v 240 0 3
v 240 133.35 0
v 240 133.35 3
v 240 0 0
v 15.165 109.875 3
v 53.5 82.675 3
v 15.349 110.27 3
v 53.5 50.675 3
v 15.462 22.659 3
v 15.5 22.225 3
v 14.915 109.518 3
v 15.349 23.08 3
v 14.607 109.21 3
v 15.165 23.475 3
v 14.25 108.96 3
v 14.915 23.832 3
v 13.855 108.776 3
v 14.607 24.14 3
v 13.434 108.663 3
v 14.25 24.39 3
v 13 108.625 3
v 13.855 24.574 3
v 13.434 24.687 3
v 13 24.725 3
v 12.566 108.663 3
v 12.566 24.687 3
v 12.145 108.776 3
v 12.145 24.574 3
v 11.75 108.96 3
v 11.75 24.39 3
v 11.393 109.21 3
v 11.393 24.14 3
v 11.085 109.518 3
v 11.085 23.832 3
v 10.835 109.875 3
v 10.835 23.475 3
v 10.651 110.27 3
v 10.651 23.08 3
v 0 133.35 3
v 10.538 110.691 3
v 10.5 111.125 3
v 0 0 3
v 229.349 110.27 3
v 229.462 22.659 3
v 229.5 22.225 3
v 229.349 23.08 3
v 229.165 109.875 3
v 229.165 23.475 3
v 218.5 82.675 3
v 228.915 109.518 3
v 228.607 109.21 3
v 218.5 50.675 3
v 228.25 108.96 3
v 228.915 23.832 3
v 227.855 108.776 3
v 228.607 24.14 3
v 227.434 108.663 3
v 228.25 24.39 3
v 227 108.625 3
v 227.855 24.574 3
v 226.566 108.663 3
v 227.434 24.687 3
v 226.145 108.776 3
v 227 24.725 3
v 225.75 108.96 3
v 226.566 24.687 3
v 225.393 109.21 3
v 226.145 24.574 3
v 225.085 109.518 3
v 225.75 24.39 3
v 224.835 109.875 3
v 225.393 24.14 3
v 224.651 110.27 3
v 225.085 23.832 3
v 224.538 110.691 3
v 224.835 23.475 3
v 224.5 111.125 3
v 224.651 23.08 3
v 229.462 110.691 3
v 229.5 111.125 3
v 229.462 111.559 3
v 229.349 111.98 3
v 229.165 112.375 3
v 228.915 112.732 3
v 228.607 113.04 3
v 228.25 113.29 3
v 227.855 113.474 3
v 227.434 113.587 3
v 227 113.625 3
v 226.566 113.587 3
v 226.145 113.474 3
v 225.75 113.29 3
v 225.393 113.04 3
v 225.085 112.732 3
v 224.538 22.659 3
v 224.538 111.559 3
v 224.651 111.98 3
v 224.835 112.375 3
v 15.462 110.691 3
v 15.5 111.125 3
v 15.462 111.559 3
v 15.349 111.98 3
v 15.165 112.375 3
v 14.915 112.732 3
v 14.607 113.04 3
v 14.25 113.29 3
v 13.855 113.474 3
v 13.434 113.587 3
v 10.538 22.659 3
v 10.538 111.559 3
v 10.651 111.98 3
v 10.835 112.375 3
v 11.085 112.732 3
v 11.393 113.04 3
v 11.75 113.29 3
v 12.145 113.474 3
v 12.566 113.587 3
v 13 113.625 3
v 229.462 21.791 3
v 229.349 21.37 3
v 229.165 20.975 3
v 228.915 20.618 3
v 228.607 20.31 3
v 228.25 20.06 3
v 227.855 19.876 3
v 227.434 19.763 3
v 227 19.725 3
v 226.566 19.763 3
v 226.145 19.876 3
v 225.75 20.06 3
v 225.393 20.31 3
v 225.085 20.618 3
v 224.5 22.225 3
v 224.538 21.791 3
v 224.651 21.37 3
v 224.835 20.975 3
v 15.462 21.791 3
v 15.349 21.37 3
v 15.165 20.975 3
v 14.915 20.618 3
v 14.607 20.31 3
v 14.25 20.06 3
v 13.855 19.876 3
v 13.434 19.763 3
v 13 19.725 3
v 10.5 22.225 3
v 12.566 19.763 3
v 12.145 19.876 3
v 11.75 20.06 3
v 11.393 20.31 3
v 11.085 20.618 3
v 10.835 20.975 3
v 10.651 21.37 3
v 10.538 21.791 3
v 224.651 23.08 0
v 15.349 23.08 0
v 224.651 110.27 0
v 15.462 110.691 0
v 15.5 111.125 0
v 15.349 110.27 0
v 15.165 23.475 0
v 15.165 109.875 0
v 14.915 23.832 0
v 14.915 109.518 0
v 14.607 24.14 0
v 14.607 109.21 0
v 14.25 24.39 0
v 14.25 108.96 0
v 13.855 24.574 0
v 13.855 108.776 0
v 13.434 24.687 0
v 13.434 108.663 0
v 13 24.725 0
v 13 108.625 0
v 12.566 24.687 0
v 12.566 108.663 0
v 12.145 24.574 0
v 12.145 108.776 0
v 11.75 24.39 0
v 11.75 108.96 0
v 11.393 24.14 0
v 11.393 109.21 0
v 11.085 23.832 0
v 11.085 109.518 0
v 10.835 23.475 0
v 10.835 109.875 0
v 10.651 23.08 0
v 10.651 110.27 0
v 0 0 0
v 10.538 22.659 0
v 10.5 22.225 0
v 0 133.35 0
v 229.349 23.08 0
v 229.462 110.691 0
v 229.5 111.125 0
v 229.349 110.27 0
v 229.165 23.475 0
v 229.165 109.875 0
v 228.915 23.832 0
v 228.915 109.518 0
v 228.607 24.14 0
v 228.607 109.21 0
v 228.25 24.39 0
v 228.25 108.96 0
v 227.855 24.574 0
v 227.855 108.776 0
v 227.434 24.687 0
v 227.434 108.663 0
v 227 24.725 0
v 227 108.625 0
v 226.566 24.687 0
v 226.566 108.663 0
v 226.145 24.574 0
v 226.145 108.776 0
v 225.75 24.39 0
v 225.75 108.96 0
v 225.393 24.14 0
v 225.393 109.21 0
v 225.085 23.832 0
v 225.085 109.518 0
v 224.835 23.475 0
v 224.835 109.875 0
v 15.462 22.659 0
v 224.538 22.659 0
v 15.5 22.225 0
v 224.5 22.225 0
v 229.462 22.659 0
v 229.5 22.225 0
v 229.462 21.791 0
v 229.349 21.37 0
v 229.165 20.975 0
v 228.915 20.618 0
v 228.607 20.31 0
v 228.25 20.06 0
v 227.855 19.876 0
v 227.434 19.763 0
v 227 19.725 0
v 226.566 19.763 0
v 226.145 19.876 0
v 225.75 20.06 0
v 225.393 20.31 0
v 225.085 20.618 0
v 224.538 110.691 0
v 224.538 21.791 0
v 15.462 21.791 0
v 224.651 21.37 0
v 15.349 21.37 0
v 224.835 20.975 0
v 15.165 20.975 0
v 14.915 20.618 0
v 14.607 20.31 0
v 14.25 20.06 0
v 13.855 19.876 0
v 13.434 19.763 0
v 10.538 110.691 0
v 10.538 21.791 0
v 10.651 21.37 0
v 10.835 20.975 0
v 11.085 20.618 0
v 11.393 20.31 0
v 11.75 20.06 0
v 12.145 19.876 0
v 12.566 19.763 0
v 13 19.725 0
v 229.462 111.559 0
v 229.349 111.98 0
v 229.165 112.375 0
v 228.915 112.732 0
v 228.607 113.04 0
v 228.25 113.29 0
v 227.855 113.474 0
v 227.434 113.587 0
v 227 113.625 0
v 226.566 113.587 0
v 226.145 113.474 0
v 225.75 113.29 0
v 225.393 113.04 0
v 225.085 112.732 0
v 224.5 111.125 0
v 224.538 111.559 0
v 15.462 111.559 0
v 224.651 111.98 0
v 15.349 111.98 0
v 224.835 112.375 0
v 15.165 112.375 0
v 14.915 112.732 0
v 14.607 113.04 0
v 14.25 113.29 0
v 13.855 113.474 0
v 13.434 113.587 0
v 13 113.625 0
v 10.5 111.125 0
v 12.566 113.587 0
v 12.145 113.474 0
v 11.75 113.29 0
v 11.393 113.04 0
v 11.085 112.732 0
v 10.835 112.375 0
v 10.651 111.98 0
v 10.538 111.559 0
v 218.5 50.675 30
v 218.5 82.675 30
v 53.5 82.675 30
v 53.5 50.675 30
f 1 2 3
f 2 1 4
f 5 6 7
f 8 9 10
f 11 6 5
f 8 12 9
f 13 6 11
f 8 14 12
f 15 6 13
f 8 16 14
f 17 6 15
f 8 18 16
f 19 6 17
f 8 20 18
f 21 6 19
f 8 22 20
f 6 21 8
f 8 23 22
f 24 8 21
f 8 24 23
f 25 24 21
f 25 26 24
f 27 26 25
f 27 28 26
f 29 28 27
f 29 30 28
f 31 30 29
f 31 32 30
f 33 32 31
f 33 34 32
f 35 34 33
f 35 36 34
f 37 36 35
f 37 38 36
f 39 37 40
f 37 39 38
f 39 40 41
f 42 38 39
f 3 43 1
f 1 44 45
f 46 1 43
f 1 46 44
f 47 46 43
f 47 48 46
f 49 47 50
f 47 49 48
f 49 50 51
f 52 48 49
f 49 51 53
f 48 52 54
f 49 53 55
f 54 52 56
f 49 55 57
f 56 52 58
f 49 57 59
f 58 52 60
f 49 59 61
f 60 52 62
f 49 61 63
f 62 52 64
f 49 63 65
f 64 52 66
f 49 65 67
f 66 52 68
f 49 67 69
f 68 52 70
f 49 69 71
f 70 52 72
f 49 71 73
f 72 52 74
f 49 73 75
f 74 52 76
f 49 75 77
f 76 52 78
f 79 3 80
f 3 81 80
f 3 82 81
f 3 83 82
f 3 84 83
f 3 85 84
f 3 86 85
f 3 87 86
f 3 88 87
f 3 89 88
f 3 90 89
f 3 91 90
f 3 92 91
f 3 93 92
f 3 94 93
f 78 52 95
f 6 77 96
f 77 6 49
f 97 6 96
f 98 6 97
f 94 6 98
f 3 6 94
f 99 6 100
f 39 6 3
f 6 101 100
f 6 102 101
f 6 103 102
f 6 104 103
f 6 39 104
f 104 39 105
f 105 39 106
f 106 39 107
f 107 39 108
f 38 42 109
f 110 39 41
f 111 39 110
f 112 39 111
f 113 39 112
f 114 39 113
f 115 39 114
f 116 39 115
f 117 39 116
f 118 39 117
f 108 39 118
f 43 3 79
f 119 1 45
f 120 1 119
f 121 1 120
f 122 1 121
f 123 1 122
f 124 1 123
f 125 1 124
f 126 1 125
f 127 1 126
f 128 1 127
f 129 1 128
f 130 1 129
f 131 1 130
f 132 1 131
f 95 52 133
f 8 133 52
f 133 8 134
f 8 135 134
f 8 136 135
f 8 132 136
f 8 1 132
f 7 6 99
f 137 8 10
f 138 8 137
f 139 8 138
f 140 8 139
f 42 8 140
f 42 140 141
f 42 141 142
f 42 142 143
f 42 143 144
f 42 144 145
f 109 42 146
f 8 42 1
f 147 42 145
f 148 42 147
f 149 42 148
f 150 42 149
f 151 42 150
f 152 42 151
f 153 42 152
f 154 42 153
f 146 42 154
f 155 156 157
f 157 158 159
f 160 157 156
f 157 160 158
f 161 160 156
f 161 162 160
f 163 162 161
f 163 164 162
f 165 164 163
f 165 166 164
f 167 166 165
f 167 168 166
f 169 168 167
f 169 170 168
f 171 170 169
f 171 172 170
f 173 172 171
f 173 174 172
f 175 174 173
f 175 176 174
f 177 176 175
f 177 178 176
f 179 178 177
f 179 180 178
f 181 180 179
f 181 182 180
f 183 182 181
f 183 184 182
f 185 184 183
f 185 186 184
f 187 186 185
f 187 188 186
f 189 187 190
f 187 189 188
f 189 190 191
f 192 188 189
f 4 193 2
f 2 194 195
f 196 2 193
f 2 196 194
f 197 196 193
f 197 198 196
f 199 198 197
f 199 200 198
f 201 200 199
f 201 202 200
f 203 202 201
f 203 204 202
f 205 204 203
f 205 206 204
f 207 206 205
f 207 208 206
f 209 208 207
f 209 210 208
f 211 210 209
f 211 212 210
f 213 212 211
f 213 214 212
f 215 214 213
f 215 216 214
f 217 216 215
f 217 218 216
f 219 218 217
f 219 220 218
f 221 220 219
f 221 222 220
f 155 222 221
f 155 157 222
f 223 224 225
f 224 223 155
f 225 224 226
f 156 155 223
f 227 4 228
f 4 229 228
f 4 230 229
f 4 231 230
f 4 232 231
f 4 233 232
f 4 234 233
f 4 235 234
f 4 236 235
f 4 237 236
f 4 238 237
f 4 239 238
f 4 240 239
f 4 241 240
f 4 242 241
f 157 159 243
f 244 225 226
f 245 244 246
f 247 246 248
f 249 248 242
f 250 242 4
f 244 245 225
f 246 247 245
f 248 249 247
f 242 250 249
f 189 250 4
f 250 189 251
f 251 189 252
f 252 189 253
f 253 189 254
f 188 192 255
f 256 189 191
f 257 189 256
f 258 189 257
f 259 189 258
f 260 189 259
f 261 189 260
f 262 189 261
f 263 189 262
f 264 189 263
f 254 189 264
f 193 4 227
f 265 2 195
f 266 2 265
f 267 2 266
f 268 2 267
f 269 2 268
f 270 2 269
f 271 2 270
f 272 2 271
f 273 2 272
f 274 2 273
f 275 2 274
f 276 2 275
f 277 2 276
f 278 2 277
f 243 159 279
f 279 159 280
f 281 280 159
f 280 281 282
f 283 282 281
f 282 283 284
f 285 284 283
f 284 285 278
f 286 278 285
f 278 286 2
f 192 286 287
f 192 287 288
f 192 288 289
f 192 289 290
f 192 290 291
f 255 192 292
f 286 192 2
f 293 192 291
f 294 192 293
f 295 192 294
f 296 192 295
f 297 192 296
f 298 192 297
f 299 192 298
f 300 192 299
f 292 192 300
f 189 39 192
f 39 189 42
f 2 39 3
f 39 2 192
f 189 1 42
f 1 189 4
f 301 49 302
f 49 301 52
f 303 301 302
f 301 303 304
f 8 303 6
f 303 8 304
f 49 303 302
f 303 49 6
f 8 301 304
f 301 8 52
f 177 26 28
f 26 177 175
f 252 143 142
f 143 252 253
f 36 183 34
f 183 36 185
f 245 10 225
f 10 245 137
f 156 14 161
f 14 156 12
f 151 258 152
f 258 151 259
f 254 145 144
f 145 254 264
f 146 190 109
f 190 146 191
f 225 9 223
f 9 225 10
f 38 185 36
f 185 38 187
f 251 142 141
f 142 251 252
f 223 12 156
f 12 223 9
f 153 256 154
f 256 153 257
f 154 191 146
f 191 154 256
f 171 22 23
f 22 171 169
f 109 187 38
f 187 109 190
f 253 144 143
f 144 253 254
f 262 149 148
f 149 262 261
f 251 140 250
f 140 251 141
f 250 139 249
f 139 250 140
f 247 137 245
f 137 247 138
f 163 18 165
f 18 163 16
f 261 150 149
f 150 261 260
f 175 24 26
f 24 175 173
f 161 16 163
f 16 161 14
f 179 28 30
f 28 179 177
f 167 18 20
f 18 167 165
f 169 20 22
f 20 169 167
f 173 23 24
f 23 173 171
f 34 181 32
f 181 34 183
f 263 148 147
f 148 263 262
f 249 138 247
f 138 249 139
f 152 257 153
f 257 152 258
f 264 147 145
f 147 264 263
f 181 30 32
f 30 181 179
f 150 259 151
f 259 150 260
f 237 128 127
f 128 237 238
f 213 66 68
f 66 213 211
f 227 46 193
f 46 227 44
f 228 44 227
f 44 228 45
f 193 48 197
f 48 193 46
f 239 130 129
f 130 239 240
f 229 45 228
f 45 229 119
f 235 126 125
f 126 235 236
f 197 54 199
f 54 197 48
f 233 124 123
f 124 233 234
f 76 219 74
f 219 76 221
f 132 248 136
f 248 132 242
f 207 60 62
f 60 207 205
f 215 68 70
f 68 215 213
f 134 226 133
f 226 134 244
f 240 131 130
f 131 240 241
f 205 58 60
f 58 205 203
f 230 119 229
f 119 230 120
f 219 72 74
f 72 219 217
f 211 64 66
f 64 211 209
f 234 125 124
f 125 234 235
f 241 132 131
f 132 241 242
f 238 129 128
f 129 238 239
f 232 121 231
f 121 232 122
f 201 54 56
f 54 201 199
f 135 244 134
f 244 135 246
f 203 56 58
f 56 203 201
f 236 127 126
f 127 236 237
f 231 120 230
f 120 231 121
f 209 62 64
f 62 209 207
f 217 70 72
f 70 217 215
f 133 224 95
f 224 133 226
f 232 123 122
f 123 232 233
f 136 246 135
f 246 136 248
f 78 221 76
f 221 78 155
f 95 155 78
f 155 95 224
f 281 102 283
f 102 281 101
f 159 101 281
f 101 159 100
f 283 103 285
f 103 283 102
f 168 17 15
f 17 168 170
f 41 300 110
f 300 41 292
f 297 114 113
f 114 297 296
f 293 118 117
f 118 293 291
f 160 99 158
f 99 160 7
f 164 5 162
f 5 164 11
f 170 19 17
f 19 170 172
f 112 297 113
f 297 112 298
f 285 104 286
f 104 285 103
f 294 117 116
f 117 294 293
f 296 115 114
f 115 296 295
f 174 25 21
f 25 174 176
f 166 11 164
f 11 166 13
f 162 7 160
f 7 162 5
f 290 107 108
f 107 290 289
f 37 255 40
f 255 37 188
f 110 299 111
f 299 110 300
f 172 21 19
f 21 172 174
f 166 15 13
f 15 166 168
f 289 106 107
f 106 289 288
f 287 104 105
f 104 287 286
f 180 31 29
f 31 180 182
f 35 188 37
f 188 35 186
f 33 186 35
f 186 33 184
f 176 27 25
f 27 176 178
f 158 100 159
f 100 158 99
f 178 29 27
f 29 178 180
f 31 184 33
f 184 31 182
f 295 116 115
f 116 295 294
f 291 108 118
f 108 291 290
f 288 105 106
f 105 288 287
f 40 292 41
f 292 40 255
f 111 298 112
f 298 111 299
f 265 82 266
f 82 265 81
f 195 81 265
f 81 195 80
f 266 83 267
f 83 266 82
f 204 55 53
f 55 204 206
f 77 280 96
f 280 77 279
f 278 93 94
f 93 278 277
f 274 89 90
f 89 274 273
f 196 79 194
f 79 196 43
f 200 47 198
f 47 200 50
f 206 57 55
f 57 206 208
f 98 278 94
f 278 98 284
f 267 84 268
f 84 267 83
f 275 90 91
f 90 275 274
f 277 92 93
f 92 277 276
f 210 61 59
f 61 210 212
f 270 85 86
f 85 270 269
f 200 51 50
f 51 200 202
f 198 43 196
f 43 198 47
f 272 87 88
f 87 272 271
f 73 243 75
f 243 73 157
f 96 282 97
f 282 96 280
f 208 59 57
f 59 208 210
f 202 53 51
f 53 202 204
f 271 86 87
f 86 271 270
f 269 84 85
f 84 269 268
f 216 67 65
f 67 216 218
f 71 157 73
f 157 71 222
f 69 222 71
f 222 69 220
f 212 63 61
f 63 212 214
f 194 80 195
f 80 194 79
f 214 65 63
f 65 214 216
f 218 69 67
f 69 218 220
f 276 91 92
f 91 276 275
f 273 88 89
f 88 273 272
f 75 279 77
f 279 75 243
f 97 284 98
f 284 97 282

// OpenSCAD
// Rack for bunch of Raspberry Pi-s
one_u=44.45;

rack_width=240;
rack_height=3*one_u;

walls_thickness=3;


//(158 × 101 × 25 mm)
device_width=158+1; //?
device_height=25+1; //?
device_depth=101; //? this is only used to make a hole

support_depth=30;

offset=16; // shift device on the plate a bit


difference(){

difference(){
union(){
//faceplate
cube([rack_width,rack_height,walls_thickness]);
    
//device support    
translate([(rack_width-device_width)/2-walls_thickness+offset,rack_height/2-(device_height/2+walls_thickness),0]) 
    cube([device_width+2*walls_thickness,device_height+2*walls_thickness,support_depth]);
}

// pi logo
translate([25,100,0]) 
linear_extrude(height = 10)
   resize([16,20]) 
   import (file = "/Users/dkachaev/Dropbox/raspberrypi_logo.dxf", scale=0.1);
}






$fn=36;


//holes (2 holes, hole 2 only in 1/3U)
union(){
    translate([13,one_u/2,-1]) cylinder(10,2.5,2.5);

    translate([rack_width-13,one_u/2,-1]) cylinder(10,2.5,2.5);


    translate([13,rack_height-one_u/2,-1]) cylinder(10,2.5,2.5);

    translate([rack_width-13,rack_height-one_u/2,-1]) cylinder(10,2.5,2.5);

}
}
